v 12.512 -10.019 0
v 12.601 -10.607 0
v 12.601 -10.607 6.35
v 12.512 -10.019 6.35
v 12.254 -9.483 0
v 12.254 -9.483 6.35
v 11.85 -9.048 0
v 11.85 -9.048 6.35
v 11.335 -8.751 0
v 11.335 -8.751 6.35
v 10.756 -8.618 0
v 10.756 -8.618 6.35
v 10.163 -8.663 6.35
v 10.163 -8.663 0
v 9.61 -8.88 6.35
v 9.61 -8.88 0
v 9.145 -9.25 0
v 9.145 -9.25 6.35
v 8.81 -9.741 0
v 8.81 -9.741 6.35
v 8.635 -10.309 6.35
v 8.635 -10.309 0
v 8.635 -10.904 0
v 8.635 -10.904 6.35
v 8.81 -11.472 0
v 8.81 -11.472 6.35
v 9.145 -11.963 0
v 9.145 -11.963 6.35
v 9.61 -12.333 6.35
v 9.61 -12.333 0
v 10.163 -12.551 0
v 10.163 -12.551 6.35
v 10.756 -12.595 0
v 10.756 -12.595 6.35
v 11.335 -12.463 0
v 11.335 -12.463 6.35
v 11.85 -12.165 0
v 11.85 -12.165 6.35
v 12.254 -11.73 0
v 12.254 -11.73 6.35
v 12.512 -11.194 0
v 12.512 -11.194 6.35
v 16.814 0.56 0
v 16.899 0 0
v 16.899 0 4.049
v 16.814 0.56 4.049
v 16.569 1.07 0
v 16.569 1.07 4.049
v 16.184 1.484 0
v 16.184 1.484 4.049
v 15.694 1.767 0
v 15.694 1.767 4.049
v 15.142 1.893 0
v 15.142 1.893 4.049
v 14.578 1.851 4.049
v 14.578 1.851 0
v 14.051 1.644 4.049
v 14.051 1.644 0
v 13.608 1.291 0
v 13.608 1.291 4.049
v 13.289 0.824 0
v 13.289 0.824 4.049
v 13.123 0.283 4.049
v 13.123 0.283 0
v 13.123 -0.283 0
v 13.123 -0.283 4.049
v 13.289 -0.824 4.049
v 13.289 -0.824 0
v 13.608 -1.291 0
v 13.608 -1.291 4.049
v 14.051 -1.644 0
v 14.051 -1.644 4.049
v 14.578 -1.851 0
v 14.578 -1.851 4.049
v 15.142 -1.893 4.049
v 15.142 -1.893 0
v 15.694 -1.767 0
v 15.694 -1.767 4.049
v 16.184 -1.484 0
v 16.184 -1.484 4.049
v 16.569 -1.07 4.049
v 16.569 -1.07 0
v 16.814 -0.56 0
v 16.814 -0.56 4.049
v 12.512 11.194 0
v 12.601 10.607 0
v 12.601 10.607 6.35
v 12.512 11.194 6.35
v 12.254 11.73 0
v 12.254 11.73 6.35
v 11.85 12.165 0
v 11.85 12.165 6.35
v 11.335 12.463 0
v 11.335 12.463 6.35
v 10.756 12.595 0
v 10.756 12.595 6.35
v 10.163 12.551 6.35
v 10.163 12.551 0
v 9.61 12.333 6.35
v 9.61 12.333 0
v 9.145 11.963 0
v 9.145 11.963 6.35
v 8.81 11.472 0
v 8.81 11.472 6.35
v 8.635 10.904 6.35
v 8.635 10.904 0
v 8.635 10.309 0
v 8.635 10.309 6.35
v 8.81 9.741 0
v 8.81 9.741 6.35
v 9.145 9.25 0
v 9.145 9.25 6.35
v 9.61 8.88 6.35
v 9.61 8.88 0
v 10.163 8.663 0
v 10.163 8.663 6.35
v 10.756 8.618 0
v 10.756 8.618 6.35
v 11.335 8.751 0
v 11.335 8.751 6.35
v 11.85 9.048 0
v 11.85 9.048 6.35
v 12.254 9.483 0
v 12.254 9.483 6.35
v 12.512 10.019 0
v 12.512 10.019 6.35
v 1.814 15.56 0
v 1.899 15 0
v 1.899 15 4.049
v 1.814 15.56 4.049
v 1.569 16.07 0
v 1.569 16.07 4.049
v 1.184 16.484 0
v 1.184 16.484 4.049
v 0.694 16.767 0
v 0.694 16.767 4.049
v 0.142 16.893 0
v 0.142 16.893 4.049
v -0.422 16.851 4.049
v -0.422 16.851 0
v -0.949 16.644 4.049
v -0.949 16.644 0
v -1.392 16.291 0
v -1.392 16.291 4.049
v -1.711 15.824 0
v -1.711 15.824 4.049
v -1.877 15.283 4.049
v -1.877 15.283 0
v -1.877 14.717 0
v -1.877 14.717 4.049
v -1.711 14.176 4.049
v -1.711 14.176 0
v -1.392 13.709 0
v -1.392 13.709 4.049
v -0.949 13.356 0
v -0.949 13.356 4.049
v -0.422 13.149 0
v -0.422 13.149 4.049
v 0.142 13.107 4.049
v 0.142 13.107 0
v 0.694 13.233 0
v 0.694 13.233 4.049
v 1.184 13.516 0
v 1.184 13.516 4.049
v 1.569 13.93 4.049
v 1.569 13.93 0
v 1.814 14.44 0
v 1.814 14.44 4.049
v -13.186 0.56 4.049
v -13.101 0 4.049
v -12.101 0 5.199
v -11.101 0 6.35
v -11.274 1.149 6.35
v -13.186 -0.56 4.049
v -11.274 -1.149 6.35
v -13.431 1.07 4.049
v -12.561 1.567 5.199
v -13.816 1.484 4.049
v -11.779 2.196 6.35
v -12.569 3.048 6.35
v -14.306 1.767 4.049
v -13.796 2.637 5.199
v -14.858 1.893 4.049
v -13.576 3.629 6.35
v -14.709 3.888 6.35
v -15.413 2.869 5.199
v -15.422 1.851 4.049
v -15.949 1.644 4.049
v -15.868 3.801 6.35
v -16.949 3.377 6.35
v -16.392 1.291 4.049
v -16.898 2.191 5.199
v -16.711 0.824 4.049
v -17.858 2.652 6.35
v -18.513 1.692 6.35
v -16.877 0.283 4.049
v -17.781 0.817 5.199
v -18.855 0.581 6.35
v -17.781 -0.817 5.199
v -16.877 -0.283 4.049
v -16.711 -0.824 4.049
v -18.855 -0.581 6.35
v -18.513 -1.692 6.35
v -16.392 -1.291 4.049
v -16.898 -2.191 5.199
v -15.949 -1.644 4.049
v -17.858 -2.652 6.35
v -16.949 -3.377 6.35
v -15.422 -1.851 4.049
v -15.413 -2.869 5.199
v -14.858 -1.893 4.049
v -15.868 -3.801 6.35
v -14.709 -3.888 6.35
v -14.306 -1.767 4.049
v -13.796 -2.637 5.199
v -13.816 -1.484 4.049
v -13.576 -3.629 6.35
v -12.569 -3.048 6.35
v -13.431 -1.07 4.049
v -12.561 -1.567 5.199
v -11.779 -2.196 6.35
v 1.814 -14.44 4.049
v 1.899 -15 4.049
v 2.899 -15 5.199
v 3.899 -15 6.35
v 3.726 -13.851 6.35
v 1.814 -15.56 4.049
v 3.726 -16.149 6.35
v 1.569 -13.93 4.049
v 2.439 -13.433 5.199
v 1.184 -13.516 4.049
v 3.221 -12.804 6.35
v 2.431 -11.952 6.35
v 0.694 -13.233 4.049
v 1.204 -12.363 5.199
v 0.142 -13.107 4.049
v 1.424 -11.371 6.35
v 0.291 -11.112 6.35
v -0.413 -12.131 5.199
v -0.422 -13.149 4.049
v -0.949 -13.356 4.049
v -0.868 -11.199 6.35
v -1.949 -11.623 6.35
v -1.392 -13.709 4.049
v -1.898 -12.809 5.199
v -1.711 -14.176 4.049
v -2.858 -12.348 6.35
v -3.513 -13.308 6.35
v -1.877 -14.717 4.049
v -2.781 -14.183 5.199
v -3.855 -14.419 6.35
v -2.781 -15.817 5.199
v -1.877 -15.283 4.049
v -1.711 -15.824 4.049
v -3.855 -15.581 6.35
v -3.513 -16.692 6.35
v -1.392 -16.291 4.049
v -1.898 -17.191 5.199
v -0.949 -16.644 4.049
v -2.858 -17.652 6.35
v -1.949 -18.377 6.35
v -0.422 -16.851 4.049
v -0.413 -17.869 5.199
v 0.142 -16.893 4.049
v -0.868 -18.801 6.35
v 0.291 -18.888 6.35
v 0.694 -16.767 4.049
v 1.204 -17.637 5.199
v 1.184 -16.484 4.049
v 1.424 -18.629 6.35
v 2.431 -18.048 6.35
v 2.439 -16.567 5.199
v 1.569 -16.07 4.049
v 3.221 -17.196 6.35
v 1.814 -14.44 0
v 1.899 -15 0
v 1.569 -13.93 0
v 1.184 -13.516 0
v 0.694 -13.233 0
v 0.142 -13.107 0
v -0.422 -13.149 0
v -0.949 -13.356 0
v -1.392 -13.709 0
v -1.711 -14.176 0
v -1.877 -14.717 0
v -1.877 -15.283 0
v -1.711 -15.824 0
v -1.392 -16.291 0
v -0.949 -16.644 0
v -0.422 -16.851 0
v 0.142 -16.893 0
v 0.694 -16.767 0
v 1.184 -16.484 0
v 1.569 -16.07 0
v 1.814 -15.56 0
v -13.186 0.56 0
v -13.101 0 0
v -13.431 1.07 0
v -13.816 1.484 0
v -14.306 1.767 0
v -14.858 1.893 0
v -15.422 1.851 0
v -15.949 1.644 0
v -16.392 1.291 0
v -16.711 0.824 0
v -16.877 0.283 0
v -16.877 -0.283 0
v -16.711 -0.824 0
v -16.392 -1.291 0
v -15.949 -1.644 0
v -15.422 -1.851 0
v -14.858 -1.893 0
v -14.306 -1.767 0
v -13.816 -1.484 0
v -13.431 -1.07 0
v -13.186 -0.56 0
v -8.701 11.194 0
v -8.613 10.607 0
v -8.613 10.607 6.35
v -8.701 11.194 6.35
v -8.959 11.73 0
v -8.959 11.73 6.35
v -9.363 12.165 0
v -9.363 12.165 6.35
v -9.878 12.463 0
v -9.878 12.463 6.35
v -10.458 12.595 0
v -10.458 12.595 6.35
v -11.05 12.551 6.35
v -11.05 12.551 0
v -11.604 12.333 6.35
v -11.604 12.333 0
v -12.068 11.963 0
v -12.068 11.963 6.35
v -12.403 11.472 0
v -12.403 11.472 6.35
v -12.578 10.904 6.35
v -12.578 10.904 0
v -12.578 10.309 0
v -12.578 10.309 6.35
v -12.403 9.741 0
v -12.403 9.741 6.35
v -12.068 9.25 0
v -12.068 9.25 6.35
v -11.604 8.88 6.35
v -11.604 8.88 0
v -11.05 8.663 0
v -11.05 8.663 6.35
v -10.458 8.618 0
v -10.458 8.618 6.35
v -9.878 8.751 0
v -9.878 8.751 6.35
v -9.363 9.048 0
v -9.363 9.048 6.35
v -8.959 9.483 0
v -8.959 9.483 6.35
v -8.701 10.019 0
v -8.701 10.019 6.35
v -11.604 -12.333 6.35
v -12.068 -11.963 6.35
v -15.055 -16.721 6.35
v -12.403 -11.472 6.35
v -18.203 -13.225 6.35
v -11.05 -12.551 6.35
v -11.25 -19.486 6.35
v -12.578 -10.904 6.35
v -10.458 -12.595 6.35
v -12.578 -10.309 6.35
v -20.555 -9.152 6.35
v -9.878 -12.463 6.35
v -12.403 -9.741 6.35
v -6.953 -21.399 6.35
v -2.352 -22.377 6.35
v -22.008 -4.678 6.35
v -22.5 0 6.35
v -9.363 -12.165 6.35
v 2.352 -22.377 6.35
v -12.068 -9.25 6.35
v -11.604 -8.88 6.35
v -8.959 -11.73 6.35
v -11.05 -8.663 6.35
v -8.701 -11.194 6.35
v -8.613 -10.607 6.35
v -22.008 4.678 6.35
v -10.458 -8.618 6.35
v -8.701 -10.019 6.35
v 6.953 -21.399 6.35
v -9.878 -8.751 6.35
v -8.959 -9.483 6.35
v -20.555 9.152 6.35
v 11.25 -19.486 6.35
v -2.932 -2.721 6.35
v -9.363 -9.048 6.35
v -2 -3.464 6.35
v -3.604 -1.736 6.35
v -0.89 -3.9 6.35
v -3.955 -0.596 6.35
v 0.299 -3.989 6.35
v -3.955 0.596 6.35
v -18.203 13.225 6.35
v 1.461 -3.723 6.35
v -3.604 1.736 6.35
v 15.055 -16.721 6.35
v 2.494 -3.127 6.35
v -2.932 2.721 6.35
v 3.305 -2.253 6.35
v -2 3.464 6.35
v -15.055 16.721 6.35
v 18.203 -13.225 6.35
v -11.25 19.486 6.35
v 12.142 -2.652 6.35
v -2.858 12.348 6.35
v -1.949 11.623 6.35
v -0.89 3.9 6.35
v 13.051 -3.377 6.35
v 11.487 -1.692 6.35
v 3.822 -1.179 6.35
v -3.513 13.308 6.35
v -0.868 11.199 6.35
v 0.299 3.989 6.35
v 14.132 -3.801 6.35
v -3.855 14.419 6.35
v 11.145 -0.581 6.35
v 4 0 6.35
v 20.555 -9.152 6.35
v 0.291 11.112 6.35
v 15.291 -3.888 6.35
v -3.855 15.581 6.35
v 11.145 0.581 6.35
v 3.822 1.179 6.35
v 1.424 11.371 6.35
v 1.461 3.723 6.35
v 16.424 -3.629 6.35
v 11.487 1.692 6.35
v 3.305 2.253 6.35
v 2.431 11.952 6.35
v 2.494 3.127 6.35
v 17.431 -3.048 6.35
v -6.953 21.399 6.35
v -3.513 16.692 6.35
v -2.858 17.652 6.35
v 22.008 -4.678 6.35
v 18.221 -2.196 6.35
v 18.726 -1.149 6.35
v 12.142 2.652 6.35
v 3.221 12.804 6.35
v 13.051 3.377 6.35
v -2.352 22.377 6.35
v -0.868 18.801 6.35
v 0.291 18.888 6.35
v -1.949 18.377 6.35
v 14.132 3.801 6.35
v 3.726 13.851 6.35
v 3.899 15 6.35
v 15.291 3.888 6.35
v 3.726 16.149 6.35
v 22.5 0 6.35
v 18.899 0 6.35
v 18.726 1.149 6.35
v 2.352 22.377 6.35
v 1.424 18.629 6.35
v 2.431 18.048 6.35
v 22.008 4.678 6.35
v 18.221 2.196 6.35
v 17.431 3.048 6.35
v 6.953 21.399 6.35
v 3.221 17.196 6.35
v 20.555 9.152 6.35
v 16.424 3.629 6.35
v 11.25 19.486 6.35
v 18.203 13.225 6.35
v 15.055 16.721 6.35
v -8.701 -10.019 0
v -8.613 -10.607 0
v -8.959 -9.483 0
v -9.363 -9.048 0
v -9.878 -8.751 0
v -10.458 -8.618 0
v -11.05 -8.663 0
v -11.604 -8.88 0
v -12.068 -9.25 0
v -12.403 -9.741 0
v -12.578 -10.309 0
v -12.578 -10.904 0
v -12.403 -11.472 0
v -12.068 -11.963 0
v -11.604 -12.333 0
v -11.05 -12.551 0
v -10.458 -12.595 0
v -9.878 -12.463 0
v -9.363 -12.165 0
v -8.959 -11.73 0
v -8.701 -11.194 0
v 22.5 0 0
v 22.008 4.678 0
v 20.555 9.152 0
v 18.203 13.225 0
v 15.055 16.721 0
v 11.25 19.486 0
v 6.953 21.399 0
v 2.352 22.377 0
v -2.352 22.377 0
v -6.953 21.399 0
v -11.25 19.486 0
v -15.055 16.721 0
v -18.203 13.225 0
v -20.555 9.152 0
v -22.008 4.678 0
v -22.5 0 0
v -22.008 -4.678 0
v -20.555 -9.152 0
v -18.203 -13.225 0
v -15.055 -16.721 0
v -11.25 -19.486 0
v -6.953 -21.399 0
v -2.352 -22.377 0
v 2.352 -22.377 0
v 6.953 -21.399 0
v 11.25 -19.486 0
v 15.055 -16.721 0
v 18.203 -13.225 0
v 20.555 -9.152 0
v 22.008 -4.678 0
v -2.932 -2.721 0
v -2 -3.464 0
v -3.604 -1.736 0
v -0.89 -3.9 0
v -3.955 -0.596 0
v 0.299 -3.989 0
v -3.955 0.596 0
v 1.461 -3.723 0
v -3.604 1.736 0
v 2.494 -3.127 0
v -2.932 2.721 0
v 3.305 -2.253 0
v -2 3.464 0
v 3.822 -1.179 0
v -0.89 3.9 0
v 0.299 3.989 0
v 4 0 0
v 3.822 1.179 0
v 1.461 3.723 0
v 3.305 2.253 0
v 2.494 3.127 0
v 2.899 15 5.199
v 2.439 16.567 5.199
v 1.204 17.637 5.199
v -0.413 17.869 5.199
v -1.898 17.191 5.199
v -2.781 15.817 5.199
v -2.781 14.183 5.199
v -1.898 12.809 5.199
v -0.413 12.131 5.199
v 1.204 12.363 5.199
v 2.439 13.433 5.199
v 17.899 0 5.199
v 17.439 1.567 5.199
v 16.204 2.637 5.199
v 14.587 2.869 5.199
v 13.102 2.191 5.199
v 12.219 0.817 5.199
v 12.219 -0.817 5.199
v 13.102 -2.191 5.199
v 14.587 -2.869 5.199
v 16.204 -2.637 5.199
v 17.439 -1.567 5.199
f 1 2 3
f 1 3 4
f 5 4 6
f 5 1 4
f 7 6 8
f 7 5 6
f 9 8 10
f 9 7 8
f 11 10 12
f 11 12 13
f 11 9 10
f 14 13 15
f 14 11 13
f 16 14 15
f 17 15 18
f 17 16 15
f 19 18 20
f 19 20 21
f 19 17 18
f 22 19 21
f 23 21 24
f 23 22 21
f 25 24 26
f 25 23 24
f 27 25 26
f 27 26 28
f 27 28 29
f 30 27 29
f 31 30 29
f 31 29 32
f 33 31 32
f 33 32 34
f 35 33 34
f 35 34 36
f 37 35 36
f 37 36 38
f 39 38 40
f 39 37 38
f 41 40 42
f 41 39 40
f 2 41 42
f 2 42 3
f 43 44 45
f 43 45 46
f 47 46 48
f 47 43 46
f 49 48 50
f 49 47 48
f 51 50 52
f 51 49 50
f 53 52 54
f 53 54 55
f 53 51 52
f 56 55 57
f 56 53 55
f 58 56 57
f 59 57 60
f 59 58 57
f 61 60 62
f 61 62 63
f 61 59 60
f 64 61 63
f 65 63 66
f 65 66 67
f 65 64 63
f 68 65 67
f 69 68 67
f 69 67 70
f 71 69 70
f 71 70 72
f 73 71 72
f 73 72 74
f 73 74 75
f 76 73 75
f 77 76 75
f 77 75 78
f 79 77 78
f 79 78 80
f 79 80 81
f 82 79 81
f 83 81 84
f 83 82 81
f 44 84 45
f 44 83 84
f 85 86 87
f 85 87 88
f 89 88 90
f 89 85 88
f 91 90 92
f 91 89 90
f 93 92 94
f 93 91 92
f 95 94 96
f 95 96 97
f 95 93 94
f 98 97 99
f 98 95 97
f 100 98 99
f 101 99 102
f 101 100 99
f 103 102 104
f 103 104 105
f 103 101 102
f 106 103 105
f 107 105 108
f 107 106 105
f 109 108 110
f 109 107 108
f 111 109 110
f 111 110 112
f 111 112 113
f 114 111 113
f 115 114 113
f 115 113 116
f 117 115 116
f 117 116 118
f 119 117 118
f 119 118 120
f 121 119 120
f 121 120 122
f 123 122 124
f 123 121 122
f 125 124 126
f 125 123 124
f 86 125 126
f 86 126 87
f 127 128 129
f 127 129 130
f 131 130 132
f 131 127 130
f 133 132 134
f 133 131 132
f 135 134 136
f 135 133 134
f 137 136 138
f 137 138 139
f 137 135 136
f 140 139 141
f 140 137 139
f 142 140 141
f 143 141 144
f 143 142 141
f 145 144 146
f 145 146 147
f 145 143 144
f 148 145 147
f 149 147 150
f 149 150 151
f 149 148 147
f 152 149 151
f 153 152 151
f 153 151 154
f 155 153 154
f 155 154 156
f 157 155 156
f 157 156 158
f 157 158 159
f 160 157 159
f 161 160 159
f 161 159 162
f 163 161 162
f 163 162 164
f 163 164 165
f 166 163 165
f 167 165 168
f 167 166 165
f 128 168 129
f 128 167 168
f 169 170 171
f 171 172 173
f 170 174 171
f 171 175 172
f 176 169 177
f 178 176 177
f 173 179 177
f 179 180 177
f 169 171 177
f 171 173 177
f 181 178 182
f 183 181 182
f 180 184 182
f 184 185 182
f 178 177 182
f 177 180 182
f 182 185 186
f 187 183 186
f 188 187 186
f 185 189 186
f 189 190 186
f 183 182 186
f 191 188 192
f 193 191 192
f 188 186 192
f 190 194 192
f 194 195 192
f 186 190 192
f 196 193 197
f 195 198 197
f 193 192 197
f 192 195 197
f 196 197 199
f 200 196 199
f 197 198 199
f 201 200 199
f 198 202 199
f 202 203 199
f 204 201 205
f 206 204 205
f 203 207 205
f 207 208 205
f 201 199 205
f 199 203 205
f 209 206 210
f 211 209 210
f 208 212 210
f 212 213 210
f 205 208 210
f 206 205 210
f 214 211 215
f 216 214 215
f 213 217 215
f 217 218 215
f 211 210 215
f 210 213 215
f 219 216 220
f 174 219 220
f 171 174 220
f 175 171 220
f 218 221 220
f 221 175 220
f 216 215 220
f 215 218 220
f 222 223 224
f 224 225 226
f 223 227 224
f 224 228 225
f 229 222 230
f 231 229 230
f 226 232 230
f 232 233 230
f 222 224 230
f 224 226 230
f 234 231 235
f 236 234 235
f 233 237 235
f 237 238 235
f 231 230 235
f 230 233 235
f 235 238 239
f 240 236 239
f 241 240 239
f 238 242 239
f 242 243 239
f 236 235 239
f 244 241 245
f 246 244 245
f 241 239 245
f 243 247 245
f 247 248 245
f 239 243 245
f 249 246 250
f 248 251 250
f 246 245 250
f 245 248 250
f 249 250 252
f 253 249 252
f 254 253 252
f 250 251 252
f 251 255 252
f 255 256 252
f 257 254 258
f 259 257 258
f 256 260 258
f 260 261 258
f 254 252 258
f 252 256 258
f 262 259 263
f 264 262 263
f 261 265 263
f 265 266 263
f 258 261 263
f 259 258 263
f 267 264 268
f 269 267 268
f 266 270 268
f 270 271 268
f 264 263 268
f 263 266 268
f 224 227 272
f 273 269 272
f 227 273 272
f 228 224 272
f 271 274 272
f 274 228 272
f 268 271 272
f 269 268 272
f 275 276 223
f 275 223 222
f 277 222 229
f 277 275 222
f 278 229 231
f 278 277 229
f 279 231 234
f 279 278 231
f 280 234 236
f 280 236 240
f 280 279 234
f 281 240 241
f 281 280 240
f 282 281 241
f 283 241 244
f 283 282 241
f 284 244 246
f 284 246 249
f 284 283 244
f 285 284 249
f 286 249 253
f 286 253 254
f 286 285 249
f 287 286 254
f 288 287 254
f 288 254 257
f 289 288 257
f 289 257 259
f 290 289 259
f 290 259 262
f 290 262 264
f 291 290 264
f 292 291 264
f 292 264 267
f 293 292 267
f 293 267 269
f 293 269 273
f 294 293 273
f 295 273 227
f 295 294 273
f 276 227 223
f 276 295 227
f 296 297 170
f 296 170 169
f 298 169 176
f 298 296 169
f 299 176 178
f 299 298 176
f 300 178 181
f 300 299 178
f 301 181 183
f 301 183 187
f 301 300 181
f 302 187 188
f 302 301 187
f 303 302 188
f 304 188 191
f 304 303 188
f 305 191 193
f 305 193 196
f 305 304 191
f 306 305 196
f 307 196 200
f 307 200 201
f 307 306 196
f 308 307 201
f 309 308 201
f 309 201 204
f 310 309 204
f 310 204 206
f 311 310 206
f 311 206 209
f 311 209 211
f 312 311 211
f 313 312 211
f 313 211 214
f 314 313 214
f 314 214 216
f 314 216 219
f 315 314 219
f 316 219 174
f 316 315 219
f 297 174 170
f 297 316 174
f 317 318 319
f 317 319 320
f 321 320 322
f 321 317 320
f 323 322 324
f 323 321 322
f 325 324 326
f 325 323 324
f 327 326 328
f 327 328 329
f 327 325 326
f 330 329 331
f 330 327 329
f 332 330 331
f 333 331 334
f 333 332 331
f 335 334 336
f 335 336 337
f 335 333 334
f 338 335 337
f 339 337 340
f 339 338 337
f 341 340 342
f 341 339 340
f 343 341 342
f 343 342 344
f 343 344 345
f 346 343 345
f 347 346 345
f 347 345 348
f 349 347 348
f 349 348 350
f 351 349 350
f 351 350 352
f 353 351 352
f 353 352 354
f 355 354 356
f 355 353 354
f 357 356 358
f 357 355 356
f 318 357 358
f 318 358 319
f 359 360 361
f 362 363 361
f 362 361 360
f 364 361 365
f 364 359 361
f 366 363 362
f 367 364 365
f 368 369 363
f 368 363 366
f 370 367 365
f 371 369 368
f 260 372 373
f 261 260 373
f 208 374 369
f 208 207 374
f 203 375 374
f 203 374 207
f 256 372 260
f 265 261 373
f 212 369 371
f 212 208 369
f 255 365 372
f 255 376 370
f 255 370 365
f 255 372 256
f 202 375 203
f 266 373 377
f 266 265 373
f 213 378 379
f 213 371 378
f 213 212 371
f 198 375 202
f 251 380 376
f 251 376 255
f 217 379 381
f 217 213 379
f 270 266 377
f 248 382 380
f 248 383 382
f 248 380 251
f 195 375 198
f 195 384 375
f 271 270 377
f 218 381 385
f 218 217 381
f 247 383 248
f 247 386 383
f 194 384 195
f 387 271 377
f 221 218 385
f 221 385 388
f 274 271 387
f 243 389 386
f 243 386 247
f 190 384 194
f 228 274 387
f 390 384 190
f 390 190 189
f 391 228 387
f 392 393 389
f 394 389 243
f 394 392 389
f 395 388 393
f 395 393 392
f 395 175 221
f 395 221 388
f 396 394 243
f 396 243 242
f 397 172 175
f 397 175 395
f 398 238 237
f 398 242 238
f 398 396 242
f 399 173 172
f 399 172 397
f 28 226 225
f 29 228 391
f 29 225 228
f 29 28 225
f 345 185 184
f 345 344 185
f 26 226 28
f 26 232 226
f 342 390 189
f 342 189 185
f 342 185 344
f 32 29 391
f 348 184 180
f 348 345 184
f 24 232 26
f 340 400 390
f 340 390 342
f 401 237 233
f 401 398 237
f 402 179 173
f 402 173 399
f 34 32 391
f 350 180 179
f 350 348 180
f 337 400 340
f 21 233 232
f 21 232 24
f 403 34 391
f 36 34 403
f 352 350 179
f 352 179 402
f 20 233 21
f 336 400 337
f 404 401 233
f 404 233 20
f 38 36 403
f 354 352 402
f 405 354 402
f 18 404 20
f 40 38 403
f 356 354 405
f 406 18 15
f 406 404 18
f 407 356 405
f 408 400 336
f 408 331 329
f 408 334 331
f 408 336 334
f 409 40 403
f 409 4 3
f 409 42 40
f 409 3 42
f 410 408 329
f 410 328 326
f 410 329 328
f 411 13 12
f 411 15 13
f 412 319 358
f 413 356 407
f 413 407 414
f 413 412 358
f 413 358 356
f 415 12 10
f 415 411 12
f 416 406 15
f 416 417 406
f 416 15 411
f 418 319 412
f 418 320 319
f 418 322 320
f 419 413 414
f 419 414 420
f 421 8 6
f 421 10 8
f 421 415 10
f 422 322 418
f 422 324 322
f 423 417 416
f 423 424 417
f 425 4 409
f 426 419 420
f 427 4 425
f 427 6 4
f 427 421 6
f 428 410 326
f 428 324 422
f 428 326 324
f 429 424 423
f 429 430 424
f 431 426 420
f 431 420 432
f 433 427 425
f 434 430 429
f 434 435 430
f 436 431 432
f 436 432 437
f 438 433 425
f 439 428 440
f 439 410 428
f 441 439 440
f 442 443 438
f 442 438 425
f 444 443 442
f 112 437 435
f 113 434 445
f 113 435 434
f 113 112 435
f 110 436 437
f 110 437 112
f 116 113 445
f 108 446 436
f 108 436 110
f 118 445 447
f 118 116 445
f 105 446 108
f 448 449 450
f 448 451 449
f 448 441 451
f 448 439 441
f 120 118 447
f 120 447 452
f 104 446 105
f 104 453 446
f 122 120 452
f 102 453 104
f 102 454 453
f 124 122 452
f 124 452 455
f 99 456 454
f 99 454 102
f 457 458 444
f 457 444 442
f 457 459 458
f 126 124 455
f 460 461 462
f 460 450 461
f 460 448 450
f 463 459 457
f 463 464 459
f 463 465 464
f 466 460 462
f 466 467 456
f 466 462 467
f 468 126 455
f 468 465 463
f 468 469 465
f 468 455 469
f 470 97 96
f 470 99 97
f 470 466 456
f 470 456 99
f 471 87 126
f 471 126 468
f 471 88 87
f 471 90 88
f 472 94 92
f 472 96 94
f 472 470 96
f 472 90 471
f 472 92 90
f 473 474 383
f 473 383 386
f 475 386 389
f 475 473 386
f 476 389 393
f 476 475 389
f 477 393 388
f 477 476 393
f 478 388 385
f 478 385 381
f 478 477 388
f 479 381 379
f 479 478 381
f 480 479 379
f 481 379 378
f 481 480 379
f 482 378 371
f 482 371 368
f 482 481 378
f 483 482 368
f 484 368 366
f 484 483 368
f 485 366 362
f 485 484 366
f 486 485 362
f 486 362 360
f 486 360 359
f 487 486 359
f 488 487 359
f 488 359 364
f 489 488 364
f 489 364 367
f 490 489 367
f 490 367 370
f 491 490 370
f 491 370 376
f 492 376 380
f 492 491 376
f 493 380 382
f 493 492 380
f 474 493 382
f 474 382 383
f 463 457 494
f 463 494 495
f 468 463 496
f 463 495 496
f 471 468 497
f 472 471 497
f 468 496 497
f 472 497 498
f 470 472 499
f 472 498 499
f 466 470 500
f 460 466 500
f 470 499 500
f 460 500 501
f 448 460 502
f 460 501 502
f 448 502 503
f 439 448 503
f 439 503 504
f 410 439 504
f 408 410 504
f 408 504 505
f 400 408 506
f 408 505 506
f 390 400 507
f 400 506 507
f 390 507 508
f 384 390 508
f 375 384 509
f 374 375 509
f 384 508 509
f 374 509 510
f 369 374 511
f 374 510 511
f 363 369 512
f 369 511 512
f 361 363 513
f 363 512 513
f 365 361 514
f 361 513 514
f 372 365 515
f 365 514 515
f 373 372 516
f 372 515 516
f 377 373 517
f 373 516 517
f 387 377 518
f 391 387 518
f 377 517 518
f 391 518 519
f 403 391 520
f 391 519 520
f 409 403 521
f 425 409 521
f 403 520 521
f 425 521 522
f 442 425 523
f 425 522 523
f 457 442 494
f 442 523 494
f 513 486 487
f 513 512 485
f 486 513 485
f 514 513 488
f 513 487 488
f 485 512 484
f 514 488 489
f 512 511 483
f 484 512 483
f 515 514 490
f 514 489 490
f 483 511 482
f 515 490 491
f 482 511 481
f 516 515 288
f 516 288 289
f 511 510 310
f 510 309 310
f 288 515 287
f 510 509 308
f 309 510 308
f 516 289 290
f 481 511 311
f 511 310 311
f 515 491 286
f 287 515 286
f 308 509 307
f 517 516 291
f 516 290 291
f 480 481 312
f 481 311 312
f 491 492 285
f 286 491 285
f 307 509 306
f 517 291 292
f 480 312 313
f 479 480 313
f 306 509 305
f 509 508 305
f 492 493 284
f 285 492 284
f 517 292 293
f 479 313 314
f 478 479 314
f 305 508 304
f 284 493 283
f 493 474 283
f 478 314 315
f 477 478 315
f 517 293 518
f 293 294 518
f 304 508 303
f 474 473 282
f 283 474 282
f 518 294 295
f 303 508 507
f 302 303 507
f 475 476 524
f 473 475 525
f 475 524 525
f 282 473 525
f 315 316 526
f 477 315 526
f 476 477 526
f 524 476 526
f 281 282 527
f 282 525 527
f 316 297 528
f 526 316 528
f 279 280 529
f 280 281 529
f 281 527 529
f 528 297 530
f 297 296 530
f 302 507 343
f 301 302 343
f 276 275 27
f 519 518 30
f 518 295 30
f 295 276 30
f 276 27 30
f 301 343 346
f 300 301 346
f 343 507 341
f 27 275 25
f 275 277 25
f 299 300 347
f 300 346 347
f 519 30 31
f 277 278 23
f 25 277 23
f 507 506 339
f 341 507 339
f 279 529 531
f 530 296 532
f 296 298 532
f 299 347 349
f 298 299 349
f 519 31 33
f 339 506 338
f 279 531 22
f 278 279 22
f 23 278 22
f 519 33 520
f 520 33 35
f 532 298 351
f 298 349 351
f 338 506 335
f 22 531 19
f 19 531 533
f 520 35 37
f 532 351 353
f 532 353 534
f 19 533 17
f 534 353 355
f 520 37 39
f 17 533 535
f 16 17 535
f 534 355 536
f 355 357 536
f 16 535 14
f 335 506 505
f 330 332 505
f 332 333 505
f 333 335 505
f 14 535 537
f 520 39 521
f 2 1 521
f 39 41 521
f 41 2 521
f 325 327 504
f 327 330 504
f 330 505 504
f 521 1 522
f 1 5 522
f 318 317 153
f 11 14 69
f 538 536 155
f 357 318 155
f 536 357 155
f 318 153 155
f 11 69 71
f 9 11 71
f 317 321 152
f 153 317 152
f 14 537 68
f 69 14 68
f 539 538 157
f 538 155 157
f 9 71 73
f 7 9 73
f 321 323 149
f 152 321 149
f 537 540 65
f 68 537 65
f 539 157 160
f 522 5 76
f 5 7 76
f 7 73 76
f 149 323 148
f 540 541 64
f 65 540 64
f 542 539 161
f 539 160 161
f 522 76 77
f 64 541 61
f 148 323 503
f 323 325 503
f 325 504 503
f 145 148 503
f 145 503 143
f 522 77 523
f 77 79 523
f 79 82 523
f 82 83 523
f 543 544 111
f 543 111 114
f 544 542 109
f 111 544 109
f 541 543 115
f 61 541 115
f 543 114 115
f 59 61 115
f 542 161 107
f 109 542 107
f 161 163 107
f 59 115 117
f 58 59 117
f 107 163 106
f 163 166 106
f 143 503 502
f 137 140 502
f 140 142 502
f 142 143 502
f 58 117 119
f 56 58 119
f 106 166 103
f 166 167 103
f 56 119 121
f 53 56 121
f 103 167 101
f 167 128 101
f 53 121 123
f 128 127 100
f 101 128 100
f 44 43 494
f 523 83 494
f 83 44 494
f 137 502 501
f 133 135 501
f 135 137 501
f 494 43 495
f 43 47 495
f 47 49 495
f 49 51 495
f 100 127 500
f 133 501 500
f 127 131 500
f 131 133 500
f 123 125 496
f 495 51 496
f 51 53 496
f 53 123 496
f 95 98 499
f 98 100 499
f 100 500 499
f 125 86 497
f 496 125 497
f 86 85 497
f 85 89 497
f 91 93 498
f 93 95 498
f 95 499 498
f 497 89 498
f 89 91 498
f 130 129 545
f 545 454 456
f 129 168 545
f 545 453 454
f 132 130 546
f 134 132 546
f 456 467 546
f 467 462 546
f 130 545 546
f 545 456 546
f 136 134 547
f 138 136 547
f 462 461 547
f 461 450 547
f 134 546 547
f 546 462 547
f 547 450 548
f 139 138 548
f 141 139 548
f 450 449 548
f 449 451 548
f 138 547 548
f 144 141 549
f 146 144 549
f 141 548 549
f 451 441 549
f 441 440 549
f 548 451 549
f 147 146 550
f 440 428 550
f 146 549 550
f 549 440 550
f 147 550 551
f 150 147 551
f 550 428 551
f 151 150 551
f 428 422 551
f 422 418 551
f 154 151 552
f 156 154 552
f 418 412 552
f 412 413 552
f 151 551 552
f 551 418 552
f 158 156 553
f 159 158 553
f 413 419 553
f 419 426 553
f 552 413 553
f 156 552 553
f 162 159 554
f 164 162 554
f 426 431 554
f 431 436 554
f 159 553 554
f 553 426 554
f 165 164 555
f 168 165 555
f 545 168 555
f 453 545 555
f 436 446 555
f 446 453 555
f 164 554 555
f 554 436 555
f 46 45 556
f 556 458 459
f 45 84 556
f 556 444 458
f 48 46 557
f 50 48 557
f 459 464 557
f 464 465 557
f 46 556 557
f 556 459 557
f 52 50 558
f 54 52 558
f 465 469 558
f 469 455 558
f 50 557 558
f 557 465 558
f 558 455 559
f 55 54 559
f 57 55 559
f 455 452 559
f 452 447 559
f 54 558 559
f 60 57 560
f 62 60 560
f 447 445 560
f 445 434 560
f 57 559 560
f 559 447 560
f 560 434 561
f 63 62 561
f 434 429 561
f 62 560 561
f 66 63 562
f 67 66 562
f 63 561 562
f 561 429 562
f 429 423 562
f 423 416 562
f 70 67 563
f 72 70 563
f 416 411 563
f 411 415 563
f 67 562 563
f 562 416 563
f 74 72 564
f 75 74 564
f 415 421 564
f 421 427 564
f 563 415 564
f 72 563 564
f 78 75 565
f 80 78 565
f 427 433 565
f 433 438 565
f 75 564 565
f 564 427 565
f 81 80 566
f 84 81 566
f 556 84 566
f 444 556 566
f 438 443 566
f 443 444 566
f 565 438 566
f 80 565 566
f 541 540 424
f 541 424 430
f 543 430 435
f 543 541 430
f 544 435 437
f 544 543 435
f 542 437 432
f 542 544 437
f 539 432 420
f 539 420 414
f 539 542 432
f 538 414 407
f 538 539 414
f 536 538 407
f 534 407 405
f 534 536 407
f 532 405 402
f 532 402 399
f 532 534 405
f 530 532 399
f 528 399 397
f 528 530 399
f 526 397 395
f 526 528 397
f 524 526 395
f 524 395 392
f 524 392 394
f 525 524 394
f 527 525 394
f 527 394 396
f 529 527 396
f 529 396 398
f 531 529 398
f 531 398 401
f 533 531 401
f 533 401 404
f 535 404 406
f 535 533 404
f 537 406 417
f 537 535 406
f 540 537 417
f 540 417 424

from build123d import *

# Parameters (mm, degrees)
SKETCH1_R             = 22.5
SKETCH1_R_2           = 4
SKETCH1_R_3           = 1.89865
SKETCH1_R_4           = 1.9939
BOSS_EXTRUDE1_DEPTH   = 6.35
CHAMFER1_SIZE         = 2.301024407
CHAMFER1_SIZE2        = 2.00025
CHAMFER1_PART_2_SIZE  = 2.301024407
CHAMFER1_PART_2_SIZE2 = 2.00025
CHAMFER1_PART_3_SIZE  = 2.301024407
CHAMFER1_PART_3_SIZE2 = 2.00025
CHAMFER1_PART_4_SIZE  = 2.301024407
CHAMFER1_PART_4_SIZE2 = 2.00025


with BuildPart() as part:
    # Sketch1 → Boss-Extrude1 (new body)
    with BuildSketch(Plane.XY):
        Circle(SKETCH1_R)
        Circle(SKETCH1_R_2, mode=Mode.SUBTRACT)
        with Locations((0, 15)):
            Circle(SKETCH1_R_3, mode=Mode.SUBTRACT)
        with Locations((10.606601718, 10.606601718)):
            Circle(SKETCH1_R_4, mode=Mode.SUBTRACT)
        with Locations((15, 0)):
            Circle(SKETCH1_R_3, mode=Mode.SUBTRACT)
        with Locations((10.606601718, -10.606601718)):
            Circle(SKETCH1_R_4, mode=Mode.SUBTRACT)
        with Locations((0, -15)):
            Circle(SKETCH1_R_3, mode=Mode.SUBTRACT)
        with Locations((-10.606601718, -10.606601718)):
            Circle(SKETCH1_R_4, mode=Mode.SUBTRACT)
        with Locations((-15, 0)):
            Circle(SKETCH1_R_3, mode=Mode.SUBTRACT)
        with Locations((-10.606601718, 10.606601718)):
            Circle(SKETCH1_R_4, mode=Mode.SUBTRACT)
    extrude(amount=BOSS_EXTRUDE1_DEPTH)

    # Chamfer1
    chamfer1_edges = [part.edges().sort_by_distance(p)[0] for p in [
        (13.10135, 0, 6.35),
    ]]
    chamfer1_side = [part.faces().sort_by_distance(p)[0] for p in [
        (13.10135, 0, 3.175),
    ]]
    chamfer(chamfer1_edges, length=CHAMFER1_SIZE, length2=CHAMFER1_SIZE2, reference=chamfer1_side[0])

    # Chamfer1 part 2
    chamfer1_part_2_edges = [part.edges().sort_by_distance(p)[0] for p in [
        (-1.89865, -15, 6.35),
    ]]
    chamfer1_part_2_side = [part.faces().sort_by_distance(p)[0] for p in [
        (-1.89865, -15, 3.175),
    ]]
    chamfer(chamfer1_part_2_edges, length=CHAMFER1_PART_2_SIZE, length2=CHAMFER1_PART_2_SIZE2, reference=chamfer1_part_2_side[0])

    # Chamfer1 part 3
    chamfer1_part_3_edges = [part.edges().sort_by_distance(p)[0] for p in [
        (-16.89865, 0, 6.35),
    ]]
    chamfer1_part_3_side = [part.faces().sort_by_distance(p)[0] for p in [
        (-16.89865, 0, 3.175),
    ]]
    chamfer(chamfer1_part_3_edges, length=CHAMFER1_PART_3_SIZE, length2=CHAMFER1_PART_3_SIZE2, reference=chamfer1_part_3_side[0])

    # Chamfer1 part 4
    chamfer1_part_4_edges = [part.edges().sort_by_distance(p)[0] for p in [
        (-1.89865, 15, 6.35),
    ]]
    chamfer1_part_4_side = [part.faces().sort_by_distance(p)[0] for p in [
        (-1.89865, 15, 3.175),
    ]]
    chamfer(chamfer1_part_4_edges, length=CHAMFER1_PART_4_SIZE, length2=CHAMFER1_PART_4_SIZE2, reference=chamfer1_part_4_side[0])


solid = part.part
